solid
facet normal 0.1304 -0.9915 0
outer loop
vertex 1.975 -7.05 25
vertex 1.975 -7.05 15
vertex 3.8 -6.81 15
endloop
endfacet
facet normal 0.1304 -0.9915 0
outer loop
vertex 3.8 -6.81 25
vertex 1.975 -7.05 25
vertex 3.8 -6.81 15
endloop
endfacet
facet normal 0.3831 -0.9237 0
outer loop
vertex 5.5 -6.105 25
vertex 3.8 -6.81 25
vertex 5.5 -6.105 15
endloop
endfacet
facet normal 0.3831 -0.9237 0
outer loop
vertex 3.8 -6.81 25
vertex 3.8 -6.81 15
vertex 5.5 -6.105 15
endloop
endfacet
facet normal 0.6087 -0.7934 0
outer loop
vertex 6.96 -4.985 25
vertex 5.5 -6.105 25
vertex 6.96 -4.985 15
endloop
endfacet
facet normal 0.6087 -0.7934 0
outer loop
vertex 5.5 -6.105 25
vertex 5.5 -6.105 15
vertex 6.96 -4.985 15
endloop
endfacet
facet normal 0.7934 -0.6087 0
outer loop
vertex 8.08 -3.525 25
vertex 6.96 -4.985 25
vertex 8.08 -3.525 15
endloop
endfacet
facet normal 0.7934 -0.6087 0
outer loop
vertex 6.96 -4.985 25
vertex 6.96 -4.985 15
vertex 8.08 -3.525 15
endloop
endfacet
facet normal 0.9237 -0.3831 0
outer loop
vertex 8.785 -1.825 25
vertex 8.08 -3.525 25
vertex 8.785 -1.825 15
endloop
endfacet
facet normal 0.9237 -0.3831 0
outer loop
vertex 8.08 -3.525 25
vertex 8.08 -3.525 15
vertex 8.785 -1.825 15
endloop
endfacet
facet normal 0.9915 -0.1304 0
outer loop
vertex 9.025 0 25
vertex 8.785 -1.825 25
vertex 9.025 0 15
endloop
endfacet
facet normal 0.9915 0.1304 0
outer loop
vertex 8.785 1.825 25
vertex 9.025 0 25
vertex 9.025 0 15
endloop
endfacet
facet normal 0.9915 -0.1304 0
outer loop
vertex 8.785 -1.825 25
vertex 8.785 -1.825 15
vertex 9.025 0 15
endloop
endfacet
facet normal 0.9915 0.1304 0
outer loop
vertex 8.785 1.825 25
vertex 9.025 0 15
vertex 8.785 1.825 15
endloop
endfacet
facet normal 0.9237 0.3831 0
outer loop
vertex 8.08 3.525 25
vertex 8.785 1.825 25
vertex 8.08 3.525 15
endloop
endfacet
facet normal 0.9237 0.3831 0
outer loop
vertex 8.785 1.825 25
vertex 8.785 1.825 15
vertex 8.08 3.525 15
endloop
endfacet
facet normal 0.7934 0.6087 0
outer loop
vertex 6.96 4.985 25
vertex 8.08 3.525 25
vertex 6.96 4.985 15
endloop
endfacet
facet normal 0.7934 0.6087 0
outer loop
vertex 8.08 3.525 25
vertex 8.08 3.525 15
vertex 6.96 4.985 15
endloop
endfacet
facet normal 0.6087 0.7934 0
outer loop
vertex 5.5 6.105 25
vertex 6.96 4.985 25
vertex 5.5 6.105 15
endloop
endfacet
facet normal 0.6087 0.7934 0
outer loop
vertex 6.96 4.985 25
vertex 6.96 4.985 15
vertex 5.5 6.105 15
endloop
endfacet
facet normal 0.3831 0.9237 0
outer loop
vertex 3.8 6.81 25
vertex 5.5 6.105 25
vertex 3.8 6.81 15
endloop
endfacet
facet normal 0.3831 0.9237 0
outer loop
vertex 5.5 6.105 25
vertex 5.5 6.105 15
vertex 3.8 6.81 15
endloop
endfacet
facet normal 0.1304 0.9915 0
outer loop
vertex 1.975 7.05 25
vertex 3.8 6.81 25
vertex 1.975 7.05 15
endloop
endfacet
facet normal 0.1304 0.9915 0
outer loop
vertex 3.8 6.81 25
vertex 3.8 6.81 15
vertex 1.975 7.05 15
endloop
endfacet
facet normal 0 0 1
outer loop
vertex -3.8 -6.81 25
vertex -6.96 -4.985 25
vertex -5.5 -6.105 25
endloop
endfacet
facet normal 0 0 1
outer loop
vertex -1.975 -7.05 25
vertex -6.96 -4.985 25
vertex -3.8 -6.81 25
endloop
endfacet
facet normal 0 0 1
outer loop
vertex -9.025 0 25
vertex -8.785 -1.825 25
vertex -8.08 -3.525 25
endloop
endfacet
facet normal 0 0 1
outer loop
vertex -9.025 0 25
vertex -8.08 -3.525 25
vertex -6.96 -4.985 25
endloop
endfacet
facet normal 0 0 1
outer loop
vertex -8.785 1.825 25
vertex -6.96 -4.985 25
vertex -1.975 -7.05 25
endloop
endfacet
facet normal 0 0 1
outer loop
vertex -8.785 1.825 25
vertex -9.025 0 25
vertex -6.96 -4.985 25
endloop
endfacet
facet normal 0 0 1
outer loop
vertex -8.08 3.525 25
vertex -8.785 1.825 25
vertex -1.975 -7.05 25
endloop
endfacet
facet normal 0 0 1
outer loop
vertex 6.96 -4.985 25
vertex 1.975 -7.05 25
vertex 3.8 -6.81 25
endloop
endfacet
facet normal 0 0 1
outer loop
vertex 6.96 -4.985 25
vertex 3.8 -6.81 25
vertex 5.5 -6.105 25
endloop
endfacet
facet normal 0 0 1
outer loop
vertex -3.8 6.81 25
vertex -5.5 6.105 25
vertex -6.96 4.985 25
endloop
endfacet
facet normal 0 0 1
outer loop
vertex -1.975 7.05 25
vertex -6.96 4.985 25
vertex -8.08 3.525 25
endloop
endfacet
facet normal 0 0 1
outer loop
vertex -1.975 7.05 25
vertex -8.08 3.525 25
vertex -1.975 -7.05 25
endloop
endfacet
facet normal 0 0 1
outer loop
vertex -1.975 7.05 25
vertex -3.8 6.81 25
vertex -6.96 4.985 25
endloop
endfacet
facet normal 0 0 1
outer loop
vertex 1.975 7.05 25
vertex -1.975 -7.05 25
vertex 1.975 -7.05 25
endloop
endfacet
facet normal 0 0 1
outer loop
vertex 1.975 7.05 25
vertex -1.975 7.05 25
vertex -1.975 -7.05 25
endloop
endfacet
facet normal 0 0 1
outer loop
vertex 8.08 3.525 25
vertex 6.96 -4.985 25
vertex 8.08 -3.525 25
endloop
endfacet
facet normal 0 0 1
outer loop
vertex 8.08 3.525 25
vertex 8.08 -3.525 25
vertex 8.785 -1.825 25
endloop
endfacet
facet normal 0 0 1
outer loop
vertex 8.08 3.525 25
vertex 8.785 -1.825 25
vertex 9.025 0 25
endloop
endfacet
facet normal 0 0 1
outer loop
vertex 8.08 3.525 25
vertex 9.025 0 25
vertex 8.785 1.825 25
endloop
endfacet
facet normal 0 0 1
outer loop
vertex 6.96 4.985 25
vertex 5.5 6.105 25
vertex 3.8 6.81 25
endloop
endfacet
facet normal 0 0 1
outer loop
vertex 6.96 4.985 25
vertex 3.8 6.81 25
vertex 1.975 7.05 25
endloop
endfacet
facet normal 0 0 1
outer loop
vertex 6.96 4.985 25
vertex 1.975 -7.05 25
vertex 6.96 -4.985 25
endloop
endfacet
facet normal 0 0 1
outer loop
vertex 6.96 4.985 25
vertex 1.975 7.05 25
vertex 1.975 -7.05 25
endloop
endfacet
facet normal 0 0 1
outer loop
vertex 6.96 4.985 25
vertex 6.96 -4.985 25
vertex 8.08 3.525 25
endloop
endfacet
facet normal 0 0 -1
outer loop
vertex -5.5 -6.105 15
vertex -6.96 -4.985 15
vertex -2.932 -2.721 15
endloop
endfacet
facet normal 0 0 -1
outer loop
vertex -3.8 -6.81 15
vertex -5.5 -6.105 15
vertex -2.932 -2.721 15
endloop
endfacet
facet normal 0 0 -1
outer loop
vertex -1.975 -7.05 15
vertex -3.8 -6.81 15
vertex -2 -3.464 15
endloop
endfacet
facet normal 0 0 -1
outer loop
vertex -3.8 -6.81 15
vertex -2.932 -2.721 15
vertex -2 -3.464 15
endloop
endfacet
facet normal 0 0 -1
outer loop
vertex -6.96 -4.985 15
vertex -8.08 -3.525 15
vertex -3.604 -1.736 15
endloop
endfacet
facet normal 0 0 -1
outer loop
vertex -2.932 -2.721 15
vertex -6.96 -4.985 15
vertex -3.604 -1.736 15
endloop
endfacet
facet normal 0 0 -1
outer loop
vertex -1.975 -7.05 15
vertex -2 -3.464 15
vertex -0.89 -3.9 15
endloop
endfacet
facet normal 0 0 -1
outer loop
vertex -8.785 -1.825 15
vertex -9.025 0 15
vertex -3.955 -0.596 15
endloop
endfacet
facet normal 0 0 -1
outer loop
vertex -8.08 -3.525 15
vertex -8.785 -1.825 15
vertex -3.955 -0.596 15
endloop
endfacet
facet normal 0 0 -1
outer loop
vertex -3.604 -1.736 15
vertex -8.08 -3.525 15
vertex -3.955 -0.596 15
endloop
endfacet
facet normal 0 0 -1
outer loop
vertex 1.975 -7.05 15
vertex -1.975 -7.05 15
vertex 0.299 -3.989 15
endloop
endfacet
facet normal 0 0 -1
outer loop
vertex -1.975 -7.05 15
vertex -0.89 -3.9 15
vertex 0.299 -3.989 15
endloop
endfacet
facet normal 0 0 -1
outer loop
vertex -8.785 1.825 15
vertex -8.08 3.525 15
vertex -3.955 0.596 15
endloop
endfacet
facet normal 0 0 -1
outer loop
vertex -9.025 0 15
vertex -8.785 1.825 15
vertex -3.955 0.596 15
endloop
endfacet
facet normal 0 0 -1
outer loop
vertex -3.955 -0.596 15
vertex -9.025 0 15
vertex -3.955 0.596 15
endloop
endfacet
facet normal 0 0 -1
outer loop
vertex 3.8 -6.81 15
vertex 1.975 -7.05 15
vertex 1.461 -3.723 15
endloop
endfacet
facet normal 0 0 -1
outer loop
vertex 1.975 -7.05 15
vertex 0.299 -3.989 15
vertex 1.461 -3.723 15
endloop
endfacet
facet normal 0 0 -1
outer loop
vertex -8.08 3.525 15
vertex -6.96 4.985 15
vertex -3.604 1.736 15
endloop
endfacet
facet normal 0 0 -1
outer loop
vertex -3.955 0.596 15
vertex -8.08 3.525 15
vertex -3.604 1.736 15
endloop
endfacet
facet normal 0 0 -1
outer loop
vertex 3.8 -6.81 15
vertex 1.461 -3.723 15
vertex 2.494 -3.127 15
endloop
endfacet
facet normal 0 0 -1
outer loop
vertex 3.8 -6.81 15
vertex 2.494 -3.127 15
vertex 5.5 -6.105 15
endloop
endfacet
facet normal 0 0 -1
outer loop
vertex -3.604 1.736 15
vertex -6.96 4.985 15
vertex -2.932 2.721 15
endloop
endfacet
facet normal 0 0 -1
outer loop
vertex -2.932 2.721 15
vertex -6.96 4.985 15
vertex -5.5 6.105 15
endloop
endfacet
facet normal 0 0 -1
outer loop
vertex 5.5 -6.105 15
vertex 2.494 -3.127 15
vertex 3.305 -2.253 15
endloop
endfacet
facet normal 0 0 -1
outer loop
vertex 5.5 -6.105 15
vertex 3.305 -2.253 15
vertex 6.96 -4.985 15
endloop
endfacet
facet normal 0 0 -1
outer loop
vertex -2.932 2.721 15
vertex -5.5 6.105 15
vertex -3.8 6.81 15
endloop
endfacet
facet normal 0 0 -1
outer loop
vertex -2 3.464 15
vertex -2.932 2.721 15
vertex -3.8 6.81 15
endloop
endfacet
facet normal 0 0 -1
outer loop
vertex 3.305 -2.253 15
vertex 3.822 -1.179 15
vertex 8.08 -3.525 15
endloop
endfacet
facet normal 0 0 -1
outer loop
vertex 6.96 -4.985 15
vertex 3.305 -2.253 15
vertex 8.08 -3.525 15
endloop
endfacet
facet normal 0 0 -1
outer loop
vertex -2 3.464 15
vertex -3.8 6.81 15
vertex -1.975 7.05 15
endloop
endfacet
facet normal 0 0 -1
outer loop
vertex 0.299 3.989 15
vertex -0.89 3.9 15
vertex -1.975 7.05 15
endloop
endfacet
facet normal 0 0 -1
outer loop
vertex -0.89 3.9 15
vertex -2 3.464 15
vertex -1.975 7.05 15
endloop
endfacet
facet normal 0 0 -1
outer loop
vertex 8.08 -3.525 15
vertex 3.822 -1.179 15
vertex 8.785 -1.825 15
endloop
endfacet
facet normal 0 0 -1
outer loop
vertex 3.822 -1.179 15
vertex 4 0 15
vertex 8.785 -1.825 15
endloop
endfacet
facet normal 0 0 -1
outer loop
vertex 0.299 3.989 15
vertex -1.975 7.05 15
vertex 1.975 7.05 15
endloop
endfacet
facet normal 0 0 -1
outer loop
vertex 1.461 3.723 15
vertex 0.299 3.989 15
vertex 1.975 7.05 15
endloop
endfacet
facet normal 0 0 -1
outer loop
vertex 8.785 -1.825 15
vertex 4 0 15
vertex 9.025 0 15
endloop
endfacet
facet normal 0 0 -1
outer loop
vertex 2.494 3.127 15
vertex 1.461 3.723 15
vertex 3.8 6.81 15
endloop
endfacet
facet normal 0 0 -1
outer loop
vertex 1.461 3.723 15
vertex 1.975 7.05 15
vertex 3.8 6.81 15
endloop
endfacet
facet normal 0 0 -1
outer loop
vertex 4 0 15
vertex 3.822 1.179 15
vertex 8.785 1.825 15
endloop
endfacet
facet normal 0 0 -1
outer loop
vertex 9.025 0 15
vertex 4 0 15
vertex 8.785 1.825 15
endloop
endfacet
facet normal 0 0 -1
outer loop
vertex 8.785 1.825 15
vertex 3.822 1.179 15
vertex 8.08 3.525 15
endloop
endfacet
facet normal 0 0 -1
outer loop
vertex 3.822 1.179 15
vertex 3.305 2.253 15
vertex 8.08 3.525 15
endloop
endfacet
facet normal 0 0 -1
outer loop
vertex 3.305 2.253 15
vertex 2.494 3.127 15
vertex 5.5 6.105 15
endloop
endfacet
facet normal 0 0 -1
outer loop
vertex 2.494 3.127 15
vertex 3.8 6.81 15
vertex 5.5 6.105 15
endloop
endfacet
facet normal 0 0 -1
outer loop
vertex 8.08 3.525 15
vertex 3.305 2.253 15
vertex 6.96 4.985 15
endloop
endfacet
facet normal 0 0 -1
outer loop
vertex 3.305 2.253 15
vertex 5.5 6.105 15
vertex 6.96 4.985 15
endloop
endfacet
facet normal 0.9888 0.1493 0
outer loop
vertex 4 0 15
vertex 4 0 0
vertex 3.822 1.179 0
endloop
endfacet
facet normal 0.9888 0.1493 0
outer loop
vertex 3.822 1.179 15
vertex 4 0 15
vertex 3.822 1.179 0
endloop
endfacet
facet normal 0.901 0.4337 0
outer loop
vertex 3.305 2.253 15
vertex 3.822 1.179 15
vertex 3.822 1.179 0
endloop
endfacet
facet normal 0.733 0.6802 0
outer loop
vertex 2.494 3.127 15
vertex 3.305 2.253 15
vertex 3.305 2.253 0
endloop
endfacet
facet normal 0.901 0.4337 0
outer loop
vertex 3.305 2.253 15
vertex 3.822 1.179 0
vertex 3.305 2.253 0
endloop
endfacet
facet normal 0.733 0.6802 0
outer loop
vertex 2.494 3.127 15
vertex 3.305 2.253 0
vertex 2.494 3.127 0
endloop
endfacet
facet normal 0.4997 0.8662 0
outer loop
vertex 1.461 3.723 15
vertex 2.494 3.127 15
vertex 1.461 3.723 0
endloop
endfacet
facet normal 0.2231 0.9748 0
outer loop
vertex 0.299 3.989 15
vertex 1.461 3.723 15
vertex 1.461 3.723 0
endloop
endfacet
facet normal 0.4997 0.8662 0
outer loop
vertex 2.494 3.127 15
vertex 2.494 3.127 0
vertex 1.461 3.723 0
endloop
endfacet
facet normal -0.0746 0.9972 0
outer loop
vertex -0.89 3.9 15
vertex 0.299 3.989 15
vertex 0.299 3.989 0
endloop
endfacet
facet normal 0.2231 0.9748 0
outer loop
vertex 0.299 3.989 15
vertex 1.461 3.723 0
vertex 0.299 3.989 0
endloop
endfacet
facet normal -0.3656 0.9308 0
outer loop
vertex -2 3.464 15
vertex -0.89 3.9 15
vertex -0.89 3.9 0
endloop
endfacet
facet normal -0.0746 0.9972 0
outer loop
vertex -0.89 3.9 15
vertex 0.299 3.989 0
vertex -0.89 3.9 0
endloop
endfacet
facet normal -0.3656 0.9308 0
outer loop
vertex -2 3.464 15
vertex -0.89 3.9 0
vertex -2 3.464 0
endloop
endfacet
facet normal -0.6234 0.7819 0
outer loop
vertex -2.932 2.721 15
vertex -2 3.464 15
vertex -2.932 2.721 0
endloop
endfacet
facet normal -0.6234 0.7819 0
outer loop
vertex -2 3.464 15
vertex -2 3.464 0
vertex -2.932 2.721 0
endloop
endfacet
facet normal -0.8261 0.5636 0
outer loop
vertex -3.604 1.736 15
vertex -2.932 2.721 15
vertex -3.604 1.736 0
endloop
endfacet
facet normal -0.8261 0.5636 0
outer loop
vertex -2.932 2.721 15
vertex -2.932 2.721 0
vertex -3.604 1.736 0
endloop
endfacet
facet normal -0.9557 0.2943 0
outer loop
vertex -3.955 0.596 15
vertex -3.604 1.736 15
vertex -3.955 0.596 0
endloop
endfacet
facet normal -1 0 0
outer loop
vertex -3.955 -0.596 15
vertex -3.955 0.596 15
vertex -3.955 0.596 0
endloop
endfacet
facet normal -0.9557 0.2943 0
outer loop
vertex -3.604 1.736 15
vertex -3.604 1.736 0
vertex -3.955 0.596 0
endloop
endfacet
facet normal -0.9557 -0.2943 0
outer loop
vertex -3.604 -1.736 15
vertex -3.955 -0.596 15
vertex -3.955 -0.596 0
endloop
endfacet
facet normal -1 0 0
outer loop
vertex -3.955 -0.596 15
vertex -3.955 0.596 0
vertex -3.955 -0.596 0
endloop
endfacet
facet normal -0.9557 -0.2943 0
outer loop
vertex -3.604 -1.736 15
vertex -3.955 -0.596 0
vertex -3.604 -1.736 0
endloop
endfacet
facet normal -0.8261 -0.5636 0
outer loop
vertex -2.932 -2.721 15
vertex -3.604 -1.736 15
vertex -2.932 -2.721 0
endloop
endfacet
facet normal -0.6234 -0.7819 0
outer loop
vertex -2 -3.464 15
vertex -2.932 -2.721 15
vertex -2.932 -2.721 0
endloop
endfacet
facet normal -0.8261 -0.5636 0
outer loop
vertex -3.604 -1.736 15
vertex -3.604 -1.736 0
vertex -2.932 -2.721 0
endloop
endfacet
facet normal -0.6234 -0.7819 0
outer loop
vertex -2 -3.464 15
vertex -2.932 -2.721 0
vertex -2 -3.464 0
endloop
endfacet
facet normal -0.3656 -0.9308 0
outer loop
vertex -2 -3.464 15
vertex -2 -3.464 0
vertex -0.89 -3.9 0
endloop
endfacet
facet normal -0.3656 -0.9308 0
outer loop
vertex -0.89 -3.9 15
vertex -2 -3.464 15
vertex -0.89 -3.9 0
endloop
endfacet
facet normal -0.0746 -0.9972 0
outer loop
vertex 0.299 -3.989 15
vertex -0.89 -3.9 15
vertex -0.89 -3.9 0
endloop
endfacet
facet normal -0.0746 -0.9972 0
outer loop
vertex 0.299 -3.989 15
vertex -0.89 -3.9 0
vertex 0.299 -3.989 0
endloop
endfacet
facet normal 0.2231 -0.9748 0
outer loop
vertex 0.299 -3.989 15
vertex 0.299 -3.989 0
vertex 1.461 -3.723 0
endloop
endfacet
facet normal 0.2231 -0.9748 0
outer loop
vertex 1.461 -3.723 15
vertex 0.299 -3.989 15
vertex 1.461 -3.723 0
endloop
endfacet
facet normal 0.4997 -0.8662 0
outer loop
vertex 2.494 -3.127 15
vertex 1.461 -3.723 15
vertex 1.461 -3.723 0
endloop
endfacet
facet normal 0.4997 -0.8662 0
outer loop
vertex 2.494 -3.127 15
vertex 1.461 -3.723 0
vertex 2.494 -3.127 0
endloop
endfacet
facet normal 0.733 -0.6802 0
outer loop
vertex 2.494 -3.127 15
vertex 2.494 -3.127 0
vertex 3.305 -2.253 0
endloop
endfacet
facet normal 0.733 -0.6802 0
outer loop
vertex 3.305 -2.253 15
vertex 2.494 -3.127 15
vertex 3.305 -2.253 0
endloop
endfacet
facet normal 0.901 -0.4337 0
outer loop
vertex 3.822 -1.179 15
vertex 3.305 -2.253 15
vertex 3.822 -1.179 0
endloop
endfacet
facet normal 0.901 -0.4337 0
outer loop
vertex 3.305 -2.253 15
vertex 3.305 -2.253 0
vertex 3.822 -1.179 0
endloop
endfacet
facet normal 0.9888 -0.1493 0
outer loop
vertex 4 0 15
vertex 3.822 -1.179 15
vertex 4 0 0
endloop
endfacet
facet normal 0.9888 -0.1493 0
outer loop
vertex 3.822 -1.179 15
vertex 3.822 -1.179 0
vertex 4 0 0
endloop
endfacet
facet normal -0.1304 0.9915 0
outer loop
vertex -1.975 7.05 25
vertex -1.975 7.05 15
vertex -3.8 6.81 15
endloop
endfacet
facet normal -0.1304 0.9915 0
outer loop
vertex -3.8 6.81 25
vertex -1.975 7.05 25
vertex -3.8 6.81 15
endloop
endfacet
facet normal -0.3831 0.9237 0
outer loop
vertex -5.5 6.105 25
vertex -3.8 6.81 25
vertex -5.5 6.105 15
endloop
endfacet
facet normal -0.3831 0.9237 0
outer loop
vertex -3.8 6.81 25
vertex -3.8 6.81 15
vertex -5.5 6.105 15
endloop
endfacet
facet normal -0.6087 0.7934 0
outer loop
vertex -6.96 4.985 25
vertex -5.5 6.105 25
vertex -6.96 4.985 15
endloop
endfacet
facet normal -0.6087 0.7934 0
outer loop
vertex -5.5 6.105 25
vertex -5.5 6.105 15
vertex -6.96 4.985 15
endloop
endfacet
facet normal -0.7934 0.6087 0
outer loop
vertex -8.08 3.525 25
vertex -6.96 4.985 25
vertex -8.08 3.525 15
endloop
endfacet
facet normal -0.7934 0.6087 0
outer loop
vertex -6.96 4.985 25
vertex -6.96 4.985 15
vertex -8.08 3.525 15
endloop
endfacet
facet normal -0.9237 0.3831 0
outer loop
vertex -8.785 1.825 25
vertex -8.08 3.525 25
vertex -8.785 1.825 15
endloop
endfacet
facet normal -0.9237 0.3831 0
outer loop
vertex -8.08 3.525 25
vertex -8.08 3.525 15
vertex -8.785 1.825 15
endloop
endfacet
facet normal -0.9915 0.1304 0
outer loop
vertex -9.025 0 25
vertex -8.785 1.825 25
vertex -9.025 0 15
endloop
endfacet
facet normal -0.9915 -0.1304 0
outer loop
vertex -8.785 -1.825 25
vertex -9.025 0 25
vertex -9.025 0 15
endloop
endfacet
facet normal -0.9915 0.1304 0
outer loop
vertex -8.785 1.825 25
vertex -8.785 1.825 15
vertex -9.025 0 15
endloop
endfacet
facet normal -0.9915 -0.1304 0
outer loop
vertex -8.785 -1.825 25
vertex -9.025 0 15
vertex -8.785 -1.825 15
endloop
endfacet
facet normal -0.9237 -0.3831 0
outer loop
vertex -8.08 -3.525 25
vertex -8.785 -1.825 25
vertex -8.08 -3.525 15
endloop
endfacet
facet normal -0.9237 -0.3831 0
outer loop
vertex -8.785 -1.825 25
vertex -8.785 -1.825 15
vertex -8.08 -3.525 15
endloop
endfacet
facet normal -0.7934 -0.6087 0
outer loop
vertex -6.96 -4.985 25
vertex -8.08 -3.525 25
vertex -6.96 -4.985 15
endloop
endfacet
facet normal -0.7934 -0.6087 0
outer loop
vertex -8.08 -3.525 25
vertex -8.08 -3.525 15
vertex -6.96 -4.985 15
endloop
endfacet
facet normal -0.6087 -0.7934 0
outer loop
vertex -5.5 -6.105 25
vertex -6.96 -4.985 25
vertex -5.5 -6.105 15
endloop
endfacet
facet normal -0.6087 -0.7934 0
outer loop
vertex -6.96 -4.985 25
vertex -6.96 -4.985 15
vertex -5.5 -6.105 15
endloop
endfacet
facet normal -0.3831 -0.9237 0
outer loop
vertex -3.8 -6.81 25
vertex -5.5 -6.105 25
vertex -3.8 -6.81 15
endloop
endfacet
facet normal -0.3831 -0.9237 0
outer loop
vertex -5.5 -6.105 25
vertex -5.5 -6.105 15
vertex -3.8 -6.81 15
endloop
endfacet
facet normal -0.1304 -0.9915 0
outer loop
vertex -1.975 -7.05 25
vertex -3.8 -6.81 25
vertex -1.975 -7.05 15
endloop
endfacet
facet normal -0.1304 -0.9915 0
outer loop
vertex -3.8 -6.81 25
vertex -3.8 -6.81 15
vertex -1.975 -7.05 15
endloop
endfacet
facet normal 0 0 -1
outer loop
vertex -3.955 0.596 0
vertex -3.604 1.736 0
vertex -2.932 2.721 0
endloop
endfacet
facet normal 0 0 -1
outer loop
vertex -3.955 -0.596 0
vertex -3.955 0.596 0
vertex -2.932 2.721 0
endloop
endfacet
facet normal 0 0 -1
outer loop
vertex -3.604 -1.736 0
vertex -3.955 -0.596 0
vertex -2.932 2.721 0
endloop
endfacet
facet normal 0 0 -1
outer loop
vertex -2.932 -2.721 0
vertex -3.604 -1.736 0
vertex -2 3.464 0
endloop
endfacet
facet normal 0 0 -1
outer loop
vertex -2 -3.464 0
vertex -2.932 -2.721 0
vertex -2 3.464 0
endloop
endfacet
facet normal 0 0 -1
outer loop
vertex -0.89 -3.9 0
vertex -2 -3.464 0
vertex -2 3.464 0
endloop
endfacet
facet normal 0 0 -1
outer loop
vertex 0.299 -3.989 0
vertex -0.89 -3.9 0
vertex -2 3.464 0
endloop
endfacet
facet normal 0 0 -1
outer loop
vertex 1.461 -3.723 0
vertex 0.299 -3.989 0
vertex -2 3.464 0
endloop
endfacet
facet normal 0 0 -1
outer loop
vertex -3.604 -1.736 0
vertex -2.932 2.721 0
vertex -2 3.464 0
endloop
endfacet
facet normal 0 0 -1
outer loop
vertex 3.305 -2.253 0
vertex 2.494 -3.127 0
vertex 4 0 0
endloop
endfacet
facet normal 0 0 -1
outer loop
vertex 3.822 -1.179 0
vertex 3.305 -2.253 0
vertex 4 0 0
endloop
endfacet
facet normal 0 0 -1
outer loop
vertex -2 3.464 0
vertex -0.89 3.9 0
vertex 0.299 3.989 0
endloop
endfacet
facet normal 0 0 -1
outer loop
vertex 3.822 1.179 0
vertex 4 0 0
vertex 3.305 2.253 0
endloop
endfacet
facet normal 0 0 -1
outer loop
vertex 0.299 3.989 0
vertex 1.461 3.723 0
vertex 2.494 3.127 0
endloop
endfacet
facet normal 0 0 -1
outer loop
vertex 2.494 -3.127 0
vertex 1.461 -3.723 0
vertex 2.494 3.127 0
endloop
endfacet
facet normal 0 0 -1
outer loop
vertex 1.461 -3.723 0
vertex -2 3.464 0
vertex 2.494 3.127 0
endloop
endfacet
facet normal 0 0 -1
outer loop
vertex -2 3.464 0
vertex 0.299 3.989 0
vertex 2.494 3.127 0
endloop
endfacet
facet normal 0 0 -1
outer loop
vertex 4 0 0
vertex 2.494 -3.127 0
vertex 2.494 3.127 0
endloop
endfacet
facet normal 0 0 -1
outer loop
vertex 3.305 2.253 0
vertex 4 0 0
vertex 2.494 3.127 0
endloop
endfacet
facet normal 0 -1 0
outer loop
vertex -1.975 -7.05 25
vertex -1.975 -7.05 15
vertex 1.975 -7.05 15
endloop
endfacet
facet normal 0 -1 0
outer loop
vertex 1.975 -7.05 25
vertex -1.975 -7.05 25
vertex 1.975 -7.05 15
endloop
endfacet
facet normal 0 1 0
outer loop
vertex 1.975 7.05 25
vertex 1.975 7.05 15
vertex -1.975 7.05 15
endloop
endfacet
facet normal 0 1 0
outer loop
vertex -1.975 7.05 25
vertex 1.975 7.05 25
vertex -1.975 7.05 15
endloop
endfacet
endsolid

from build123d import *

# Parameters (mm, degrees)
F0_R     = 4
F1_DEPTH = 15
F3_DEPTH = 10


with BuildPart() as f1:
    # F0 (on Top) → F1 (new body)
    with BuildSketch(Plane.XY):
        Circle(F0_R)
    extrude(amount=F1_DEPTH)

    # F2 (on face) → F3 (join)
    with BuildSketch(Plane.XY.offset(15)):
        with BuildLine():
            Line((0, -7.05), (0, 0))
            Line((0, 0), (0, 7.05))
            Line((0, 7.05), (-1.975, 7.05))
            ThreePointArc((-1.975, 7.05), (-9.025, 0), (-1.975, -7.05))
            Line((-1.975, -7.05), (0, -7.05))
        make_face()
        with BuildLine():
            Line((0, 7.05), (0, 0))
            Line((0, 0), (0, -7.05))
            Line((0, -7.05), (1.975, -7.05))
            ThreePointArc((1.975, -7.05), (9.025, 0), (1.975, 7.05))
            Line((1.975, 7.05), (0, 7.05))
        make_face()
    extrude(amount=F3_DEPTH)


solid = f1.part
